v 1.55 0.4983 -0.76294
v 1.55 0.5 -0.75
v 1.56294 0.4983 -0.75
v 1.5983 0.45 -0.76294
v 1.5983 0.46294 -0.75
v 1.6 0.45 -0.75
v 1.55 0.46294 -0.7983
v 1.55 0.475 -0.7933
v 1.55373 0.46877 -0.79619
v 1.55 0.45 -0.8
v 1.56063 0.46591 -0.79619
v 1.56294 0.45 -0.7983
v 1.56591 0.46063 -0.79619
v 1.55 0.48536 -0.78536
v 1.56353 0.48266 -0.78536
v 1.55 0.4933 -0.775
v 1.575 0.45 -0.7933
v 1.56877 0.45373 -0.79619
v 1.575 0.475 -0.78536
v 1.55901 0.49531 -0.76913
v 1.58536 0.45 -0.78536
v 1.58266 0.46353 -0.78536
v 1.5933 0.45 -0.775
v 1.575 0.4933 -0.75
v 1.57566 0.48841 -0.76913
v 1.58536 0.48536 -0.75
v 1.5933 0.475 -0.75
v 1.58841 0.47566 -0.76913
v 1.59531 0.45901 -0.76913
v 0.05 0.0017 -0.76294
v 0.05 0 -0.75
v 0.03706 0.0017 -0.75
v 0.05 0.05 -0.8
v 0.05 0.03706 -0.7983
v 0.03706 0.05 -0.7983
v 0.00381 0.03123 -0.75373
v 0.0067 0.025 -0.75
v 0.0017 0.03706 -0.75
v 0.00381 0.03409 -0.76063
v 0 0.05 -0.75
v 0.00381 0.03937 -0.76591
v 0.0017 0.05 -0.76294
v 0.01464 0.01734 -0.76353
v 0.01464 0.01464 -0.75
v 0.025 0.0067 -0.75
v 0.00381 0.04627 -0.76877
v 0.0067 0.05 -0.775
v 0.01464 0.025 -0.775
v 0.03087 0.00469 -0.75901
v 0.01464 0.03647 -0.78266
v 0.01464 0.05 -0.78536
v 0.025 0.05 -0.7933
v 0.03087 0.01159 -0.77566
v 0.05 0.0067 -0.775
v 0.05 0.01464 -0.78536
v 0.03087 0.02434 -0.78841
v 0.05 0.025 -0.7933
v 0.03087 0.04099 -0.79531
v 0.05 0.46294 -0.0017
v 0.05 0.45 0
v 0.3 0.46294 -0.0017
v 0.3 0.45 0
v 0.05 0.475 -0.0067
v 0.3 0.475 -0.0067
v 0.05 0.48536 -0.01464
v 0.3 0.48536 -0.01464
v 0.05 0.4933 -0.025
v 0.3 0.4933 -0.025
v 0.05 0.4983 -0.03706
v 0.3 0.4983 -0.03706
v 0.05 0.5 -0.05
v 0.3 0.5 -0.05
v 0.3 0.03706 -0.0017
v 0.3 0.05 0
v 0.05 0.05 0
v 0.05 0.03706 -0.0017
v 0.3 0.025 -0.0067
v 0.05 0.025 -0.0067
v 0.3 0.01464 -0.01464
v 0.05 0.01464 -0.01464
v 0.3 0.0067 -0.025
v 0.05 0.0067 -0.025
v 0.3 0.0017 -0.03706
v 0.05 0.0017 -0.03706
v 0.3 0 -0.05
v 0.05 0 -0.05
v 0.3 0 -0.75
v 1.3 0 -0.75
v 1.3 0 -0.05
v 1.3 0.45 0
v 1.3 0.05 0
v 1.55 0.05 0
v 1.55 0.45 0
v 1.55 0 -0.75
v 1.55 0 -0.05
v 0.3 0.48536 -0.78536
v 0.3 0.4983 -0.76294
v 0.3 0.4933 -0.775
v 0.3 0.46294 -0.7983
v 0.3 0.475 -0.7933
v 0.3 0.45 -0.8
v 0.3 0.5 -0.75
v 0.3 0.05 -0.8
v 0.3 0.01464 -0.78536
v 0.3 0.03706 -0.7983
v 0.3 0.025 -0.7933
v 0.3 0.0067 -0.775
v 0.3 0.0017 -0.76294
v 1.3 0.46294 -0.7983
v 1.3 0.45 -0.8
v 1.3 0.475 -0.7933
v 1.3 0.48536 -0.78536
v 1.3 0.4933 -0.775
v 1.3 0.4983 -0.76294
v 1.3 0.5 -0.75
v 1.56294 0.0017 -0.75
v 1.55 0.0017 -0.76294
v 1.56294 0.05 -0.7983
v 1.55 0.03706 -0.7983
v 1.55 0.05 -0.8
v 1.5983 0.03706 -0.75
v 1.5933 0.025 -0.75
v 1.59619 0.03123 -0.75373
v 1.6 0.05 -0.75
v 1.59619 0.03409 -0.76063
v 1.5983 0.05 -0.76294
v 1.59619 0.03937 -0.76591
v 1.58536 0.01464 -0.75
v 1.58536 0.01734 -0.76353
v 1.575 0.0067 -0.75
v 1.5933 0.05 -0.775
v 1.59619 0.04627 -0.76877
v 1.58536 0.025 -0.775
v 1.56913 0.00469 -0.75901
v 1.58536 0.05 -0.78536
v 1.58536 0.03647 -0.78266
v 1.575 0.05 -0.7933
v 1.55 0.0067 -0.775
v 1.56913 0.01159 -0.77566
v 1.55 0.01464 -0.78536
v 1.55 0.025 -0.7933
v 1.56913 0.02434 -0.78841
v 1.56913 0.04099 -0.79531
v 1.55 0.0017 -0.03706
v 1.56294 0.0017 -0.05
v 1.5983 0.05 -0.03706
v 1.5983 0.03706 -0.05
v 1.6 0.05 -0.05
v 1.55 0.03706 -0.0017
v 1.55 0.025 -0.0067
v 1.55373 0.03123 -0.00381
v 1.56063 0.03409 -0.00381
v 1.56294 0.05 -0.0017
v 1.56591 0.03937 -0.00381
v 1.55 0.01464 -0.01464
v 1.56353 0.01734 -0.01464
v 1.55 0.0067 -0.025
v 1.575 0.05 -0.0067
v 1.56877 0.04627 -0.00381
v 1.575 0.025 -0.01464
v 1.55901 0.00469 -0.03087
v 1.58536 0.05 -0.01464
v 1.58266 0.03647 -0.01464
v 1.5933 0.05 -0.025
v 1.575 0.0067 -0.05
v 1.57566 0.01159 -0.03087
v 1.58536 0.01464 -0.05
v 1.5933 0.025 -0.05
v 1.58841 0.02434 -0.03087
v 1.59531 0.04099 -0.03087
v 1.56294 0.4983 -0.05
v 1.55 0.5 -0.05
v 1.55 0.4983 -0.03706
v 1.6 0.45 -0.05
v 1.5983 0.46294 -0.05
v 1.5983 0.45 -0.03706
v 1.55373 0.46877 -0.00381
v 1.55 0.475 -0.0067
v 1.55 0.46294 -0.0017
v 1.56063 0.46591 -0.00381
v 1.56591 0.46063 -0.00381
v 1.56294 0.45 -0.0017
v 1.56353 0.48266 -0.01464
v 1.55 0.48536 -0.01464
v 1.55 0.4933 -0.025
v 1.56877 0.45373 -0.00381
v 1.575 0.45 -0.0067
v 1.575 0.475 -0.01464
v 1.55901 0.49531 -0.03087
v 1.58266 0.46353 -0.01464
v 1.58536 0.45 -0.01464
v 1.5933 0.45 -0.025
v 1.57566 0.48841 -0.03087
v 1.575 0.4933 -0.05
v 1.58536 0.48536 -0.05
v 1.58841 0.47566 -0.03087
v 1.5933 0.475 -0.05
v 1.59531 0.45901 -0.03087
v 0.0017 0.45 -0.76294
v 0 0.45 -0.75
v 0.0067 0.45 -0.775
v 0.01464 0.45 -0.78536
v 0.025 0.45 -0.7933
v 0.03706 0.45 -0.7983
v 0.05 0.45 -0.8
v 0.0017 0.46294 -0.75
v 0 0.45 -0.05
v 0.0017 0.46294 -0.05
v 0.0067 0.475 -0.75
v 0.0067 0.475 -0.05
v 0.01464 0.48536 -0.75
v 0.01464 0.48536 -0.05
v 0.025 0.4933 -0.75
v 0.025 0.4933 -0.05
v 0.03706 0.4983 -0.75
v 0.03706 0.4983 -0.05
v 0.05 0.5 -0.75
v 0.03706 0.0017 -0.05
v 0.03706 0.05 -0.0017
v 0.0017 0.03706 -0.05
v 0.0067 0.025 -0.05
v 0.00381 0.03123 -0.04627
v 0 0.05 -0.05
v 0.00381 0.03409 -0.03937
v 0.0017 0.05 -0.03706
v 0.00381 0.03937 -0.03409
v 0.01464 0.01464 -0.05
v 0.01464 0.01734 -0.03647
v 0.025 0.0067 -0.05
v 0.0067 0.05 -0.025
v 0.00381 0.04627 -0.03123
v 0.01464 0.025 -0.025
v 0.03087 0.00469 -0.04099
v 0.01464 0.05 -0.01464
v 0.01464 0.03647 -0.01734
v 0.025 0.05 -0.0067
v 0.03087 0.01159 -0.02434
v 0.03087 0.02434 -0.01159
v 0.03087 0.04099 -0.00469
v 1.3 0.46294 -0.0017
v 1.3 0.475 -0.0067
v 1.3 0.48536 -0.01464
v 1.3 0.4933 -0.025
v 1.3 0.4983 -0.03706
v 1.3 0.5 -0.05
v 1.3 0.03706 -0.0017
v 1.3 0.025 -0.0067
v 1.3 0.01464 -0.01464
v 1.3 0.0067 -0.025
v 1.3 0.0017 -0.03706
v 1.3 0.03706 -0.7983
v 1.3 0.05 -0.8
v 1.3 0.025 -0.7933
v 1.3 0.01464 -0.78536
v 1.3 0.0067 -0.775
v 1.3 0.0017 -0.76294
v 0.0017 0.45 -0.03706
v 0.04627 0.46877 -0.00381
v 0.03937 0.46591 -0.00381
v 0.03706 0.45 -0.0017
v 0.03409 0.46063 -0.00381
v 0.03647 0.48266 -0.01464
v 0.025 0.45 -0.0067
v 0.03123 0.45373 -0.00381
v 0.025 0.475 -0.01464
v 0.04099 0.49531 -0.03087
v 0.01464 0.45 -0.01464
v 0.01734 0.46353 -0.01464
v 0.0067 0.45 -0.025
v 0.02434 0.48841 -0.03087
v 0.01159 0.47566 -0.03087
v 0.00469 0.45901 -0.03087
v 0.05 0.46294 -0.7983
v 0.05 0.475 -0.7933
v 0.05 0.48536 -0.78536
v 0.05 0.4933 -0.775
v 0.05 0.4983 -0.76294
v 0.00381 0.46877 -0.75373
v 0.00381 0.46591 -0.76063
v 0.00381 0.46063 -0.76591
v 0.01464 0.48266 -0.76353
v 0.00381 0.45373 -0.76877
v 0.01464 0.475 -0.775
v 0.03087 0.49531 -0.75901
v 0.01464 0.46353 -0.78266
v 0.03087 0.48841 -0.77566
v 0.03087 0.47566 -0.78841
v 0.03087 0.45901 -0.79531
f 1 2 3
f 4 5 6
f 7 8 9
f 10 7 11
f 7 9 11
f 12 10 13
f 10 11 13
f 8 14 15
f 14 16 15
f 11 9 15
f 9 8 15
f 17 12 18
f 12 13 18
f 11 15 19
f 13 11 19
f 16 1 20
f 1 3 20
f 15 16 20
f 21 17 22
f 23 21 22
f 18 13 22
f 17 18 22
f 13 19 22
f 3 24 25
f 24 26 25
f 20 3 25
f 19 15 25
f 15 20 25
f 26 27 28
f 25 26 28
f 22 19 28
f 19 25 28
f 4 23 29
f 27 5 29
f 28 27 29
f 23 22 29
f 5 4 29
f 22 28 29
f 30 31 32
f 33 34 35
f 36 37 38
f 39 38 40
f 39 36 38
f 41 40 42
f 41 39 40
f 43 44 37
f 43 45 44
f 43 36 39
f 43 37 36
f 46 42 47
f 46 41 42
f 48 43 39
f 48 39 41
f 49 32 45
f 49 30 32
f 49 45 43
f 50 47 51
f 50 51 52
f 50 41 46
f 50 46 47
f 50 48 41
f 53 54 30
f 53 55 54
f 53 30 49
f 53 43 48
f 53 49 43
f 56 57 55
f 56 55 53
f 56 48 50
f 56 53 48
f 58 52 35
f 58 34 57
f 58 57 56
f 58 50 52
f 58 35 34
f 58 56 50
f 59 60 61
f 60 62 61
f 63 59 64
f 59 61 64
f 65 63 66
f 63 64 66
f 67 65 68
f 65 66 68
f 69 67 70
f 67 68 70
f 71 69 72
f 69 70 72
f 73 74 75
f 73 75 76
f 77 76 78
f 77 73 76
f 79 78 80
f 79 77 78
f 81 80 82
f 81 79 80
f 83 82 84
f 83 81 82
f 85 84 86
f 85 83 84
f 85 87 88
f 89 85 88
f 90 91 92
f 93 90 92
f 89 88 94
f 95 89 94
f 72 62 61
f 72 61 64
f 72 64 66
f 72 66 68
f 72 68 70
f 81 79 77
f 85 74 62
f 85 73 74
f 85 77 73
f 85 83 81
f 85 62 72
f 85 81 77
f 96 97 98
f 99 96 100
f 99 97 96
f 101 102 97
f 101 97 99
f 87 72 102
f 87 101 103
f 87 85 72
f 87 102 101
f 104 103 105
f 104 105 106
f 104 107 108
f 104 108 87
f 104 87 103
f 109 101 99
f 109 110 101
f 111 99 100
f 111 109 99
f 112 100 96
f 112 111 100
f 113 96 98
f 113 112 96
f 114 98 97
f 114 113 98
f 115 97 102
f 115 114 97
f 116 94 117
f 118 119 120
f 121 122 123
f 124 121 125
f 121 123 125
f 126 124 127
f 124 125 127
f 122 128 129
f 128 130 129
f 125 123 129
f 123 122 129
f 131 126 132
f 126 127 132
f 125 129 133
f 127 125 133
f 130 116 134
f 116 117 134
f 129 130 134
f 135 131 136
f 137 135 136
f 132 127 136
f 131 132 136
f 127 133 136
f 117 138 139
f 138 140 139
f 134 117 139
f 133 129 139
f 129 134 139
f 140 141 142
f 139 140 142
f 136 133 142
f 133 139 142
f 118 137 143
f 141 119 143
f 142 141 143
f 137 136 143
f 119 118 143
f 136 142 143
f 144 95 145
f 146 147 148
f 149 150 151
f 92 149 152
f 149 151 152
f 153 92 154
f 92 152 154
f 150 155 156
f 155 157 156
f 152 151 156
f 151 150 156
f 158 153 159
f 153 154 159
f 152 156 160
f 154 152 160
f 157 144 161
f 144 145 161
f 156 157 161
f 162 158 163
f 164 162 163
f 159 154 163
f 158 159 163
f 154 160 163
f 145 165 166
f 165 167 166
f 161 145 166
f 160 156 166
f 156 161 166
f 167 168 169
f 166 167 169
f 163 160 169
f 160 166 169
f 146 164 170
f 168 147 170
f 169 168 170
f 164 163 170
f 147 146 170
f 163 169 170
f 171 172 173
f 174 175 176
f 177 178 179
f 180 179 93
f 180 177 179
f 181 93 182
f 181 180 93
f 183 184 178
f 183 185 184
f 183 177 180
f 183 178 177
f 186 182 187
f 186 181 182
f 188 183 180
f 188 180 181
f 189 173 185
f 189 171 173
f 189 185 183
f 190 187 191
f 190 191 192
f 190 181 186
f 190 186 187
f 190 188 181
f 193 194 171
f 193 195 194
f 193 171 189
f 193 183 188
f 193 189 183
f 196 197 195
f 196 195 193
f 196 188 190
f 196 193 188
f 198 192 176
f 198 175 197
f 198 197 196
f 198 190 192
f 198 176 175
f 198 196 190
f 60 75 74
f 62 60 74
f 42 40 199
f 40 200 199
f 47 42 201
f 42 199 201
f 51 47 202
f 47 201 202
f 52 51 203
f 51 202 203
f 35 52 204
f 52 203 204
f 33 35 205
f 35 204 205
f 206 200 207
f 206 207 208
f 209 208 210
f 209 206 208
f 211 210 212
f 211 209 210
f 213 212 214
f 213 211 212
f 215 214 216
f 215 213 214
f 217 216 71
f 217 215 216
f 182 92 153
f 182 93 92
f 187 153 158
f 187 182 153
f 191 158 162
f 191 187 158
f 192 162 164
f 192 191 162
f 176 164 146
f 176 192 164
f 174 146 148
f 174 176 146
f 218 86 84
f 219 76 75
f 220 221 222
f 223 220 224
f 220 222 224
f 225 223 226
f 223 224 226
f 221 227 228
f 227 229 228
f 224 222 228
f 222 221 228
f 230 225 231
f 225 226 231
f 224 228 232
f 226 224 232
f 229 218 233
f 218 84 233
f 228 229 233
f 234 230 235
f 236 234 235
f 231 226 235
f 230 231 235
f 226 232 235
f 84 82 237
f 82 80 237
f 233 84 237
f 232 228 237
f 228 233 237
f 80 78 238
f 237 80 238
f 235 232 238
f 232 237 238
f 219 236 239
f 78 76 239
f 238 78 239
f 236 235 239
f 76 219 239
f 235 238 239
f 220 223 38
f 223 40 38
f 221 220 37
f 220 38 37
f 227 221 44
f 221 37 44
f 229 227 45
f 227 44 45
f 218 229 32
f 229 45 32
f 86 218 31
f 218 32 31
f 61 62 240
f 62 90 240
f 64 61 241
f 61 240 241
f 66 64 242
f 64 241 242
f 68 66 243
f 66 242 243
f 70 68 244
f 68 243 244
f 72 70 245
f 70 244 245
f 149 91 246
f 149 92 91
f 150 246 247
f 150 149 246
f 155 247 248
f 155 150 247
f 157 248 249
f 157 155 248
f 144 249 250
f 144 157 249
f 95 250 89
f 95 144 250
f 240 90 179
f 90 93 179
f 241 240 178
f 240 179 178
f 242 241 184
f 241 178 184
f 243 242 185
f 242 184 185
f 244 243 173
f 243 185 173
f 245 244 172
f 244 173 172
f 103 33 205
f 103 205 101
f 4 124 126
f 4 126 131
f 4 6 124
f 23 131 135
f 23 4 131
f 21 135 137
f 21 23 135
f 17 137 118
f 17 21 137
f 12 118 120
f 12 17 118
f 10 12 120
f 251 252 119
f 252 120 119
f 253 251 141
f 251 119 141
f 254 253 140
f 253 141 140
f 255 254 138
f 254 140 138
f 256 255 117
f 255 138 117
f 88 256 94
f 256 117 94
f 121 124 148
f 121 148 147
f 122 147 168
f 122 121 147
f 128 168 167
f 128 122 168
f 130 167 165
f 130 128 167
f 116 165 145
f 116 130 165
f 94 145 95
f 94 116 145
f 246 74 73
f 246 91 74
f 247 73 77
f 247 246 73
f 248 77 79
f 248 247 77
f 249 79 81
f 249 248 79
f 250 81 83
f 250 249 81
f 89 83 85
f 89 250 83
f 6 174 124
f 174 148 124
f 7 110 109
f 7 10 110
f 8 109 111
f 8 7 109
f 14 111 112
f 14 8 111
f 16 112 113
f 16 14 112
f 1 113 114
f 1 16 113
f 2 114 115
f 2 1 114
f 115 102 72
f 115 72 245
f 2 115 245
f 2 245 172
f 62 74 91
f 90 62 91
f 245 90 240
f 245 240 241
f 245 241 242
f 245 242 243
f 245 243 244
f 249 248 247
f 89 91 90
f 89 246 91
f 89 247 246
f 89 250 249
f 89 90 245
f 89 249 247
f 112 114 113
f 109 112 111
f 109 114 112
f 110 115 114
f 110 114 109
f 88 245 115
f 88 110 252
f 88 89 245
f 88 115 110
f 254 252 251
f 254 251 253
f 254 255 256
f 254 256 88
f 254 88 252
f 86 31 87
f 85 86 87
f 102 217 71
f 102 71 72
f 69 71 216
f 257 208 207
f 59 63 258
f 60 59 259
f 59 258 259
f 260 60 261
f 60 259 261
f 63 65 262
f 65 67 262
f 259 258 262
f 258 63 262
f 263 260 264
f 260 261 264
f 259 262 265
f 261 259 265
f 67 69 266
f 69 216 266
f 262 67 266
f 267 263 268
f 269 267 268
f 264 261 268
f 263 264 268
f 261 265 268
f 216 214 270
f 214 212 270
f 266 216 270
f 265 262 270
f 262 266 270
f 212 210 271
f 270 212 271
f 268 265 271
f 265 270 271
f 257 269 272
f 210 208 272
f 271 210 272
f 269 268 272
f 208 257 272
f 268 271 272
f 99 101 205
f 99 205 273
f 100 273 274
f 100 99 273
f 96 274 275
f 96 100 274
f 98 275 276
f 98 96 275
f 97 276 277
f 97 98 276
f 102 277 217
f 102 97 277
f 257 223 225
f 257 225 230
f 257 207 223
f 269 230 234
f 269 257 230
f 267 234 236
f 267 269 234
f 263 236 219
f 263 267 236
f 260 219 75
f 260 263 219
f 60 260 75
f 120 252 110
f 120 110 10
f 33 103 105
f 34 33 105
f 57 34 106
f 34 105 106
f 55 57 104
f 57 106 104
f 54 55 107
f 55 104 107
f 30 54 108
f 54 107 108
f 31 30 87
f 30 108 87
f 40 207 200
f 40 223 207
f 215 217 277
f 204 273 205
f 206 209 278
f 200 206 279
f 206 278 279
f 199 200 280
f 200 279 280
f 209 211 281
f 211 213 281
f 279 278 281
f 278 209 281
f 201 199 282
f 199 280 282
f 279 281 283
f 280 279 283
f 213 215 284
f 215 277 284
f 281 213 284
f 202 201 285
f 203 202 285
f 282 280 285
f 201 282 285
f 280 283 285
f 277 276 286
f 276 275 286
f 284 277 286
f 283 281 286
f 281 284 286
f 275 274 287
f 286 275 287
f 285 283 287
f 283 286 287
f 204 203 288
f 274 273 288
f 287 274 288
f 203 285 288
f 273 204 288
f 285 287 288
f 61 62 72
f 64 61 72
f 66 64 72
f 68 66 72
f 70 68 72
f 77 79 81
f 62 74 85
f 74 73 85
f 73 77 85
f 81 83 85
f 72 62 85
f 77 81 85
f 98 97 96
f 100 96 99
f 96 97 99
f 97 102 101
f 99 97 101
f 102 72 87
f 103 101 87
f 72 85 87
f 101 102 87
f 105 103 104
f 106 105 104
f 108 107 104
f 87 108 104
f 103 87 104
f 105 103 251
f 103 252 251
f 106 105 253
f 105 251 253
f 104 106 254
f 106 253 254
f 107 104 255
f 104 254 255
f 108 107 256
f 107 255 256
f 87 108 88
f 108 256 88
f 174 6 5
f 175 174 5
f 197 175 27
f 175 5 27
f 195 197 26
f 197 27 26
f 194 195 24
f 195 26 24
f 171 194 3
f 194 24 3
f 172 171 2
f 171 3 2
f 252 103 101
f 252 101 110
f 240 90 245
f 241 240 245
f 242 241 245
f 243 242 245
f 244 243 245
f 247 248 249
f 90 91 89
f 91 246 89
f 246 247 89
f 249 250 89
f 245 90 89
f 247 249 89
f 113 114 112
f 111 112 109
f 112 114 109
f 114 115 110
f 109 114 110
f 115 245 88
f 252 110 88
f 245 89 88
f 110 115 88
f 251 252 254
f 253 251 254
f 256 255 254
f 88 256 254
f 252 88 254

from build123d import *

# Parameters (mm, degrees)
SKETCH1_W             = 0.3
SKETCH1_H             = 0.8
BOSS_EXTRUDE1_DEPTH   = 0.5
BOSS_EXTRUDE1_2_DEPTH = 0.5
SKETCH2_W             = 1
SKETCH2_H             = 0.8
BOSS_EXTRUDE2_DEPTH   = 0.5
FILLET1_R             = 0.05
FILLET2_R             = 0.05
FILLET3_R             = 0.05


with BuildPart() as part:
    # Sketch1 → Boss-Extrude1 (new body)
    with BuildSketch(Plane(origin=(0, 0, 0), x_dir=(1, 0, 0), z_dir=(0, 1, 0))):
        with Locations((0.15, 0.4)):
            Rectangle(SKETCH1_W, SKETCH1_H)
    extrude(amount=BOSS_EXTRUDE1_DEPTH)

    # Fillet1
    fillet1_edges = [part.edges().sort_by_distance(p)[0] for p in [
        (0.15, 0.5, -0.8),
        (0, 0.5, -0.4),
        (0.15, 0, -0.8),
        (0.15, 0, 0),
        (0, 0, -0.4),
        (0.15, 0.5, 0),
        (0, 0.25, -0.8),
        (0, 0.25, 0),
    ]]
    fillet(fillet1_edges, radius=FILLET1_R)


with BuildPart() as body_2:
    # Sketch1 → Boss-Extrude1 2 (new body)
    with BuildSketch(Plane(origin=(0, 0, 0), x_dir=(1, 0, 0), z_dir=(0, 1, 0))):
        with Locations((1.45, 0.4)):
            Rectangle(SKETCH1_W, SKETCH1_H)
    extrude(amount=BOSS_EXTRUDE1_2_DEPTH)

    # Fillet2
    fillet2_edges = [body_2.edges().sort_by_distance(p)[0] for p in [
        (1.6, 0.5, -0.4),
        (1.45, 0.5, -0.8),
        (1.45, 0, -0.8),
        (1.6, 0, -0.4),
        (1.45, 0, 0),
        (1.45, 0.5, 0),
        (1.6, 0.25, -0.8),
        (1.6, 0.25, 0),
    ]]
    fillet(fillet2_edges, radius=FILLET2_R)


with BuildPart() as body_3:
    # Sketch2 → Boss-Extrude2 (new body)
    with BuildSketch(Plane(origin=(0, 0, 0), x_dir=(1, 0, 0), z_dir=(0, 1, 0))):
        with Locations((0.8, 0.4)):
            Rectangle(SKETCH2_W, SKETCH2_H)
    extrude(amount=BOSS_EXTRUDE2_DEPTH)

    # Fillet3
    fillet3_edges = [body_3.edges().sort_by_distance(p)[0] for p in [
        (0.8, 0.5, -0.8),
        (0.8, 0, -0.8),
        (0.8, 0, 0),
        (0.8, 0.5, 0),
    ]]
    fillet(fillet3_edges, radius=FILLET3_R)


solid = Compound([part.part, body_2.part, body_3.part])
